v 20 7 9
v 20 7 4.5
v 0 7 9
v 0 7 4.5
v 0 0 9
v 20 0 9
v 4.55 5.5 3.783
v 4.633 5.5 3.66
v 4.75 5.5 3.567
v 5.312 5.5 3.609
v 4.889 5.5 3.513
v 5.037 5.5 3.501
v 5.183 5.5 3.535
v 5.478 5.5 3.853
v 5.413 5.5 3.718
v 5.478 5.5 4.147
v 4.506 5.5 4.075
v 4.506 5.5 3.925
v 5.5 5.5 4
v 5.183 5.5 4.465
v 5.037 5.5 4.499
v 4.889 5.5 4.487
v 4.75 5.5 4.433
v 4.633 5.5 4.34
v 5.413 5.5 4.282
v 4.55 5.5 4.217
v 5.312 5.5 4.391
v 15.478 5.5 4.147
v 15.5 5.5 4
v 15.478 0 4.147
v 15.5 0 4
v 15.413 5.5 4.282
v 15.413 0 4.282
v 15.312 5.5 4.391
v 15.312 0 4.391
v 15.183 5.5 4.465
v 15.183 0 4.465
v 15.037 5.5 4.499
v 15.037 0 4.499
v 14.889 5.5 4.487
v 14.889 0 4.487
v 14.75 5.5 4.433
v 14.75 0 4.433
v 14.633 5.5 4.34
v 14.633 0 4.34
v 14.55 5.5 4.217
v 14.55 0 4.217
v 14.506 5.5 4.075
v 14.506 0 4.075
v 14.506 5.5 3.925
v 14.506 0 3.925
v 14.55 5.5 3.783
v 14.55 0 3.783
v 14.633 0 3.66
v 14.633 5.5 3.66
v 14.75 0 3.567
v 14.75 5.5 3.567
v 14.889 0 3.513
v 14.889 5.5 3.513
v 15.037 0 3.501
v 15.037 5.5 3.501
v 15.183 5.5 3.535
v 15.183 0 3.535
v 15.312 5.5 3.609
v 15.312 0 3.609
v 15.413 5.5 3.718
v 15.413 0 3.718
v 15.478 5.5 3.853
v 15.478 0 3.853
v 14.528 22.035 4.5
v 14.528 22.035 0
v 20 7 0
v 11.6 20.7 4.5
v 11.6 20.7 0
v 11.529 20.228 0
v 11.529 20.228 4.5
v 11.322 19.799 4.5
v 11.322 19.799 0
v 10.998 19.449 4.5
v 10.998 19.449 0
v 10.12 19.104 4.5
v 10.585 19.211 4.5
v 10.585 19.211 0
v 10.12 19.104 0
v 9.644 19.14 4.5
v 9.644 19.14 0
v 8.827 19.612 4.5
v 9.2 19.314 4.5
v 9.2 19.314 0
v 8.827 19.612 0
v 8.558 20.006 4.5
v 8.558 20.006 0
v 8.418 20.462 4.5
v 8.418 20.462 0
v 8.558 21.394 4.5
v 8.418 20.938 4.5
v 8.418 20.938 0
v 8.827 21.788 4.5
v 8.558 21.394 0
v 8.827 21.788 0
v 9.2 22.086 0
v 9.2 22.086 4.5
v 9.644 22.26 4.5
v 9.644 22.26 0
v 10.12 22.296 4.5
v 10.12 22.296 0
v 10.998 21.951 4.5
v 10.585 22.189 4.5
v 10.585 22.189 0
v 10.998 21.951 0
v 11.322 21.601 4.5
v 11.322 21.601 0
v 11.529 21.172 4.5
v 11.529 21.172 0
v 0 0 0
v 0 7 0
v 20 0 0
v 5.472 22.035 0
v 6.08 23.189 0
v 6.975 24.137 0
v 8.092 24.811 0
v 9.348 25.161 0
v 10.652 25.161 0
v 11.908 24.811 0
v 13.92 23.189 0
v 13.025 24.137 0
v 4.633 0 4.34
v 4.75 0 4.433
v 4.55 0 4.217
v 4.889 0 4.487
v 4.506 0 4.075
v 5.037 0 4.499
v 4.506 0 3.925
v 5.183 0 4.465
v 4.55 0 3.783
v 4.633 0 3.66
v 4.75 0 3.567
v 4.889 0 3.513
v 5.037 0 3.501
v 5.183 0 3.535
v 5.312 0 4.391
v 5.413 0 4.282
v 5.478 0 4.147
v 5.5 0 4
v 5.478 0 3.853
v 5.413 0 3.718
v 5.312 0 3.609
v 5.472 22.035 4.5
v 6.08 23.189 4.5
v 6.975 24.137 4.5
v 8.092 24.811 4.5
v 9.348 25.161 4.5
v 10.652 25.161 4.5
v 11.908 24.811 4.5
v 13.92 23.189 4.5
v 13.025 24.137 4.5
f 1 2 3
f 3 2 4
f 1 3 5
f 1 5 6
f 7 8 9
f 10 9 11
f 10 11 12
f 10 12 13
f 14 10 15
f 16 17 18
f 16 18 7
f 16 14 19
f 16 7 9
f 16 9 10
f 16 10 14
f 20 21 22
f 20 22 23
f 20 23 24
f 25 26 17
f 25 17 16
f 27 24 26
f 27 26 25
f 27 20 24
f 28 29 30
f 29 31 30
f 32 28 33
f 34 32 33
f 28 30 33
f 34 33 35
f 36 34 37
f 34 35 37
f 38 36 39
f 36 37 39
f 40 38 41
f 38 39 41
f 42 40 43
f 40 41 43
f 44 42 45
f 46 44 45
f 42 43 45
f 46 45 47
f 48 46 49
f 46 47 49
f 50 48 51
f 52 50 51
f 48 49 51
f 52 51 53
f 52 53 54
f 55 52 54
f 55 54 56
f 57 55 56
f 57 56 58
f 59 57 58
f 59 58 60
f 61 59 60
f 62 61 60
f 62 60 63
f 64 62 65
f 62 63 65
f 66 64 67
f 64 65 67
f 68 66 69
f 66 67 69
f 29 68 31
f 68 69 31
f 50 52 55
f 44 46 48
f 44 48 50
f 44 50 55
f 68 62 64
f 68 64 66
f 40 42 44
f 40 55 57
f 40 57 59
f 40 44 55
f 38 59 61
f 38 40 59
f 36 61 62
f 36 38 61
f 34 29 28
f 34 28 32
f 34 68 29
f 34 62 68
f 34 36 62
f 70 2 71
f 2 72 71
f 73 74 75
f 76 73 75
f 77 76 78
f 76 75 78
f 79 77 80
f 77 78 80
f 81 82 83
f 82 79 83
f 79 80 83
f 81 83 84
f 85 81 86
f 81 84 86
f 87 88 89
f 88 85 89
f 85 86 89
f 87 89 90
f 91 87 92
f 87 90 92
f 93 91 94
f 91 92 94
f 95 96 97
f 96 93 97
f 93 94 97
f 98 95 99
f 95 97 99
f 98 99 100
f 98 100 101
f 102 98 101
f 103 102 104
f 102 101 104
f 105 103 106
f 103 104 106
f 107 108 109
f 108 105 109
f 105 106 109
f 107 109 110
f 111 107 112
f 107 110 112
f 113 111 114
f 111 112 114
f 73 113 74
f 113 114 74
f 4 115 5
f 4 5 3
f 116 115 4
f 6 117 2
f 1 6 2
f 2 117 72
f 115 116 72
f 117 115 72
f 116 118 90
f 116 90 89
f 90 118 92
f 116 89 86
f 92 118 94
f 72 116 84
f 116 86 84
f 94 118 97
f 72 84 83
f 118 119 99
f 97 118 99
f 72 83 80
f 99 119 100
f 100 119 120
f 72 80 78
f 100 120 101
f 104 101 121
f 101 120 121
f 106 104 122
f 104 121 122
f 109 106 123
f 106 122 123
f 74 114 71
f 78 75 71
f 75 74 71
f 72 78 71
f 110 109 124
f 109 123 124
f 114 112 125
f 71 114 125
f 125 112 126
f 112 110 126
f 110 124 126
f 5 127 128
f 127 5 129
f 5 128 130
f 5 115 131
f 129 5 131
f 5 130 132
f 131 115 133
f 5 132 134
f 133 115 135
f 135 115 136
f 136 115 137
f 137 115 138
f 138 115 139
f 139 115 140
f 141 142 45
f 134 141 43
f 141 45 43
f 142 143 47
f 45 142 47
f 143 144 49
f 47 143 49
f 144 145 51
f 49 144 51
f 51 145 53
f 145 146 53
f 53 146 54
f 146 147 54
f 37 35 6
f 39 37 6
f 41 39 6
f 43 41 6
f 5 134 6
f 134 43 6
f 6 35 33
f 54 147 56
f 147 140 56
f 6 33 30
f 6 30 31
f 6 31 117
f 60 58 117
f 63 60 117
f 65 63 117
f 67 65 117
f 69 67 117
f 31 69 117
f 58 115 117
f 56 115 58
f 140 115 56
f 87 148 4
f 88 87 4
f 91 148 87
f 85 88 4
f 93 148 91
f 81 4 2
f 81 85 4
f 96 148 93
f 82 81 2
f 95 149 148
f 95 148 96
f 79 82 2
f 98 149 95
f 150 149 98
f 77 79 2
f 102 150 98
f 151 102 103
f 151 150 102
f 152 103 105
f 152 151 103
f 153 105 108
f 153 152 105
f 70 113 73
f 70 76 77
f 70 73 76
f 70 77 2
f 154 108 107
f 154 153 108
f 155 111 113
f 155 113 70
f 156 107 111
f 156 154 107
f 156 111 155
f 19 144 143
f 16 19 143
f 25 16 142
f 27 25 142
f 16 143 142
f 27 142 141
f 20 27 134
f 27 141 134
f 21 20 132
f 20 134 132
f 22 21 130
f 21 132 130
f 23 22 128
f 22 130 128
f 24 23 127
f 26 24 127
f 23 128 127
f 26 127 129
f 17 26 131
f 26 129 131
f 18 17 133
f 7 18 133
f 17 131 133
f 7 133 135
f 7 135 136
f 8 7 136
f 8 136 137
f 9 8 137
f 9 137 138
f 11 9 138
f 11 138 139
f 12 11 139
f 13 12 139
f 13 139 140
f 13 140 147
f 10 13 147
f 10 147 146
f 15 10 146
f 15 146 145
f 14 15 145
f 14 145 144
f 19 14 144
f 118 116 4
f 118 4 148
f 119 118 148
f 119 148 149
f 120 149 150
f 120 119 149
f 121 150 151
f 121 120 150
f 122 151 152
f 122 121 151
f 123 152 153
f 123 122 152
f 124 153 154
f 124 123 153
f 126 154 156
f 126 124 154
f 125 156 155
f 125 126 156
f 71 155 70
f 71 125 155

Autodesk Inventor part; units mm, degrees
ref_plane "YZ Plane" through (0, 0, 0) normal (1, 0, 0) x (0, 1, 0)
ref_plane "XZ Plane" through (0, 0, 0) normal (0, 1, 0) x (-1, 0, 0)
ref_plane "XY Plane" through (0, 0, 0) normal (0, 0, 1) x (1, 0, 0)
sketch "Sketch1" plane through (0, 0, 0) normal (0, 0, 1) x (1, 0, 0)
  circle A0 centre (10, 20.7) radius 1.6
  line L0 (0, 0) -> (20.0001, 0)
  line L1 (0, 0) -> (0, 7)
  line L2 (20.0001, 0) -> (20.0001, 6.9998)
  line L3 (0, 7) -> (5.4723, 22.0351)
  line L4 (0, 7) -> (16, 7) construction
  line L5 (20.0001, 6.9998) -> (14.5277, 22.0349)
  line L6 (20.0001, 6.9998) -> (36.0001, 6.9998) construction
  arc A1 (14.5277, 22.0349) -> (5.4723, 22.0351) centre (10, 20.3869) ccw
  dimension "d17" = 7
  dimension "d18" = 6.9998
  dimension "d19" = 20.7
  dimension "d23" = 90
  dimension "d24" = 90
  dimension "d25" = 10
  dimension "d26" = 16
  dimension "d27" = 70
  dimension "d28" = 16
  dimension "d29" = 110
  dimension "d30" = 10
sketch "Sketch3" plane through (0, 0, 0) normal (0, 0, 1) x (1, 0, 0)
  point P0 (0, 0)
extrude "Extrusion1" add sketch "Sketch1" along normal blind 4.5
sketch "Sketch4" plane through (0, 0, 4.5) normal (0, 0, 1) x (1, 0, 0)
  line L0 (0, 7) -> (0, 0) projected
  line L1 (20.0001, 0) -> (20.0001, 6.9998) projected
  line L2 (0, 0) -> (20.0001, 0)
  line L3 (20.0001, 0) -> (20.0001, 6.9998)
  line L4 (3.884, 22.9404) -> (-0.0481, 7.0119) projected
  line L5 (20.0001, 6.9998) -> (0, 6.9998)
  line L6 (0, 7) -> (0, 0)
extrude "Extrusion2" add sketch "Sketch4" along normal blind 4.5
sketch "Sketch5" plane through (0, 0, 0) normal (0, -1, 0) x (1, 0, 0)
  circle A0 centre (5, 4) radius 0.5
  circle A1 centre (15, 4) radius 0.5
  line L0 (0, 0) -> (20.0001, 0) projected
  line L1 (0, 9) -> (20.0001, 9) projected
  dimension "d13" = 1
  dimension "d14" = 1
  dimension "d33" = 5
  dimension "d34" = 5
extrude "Extrusion3" cut sketch "Sketch5" against normal blind 5.5
properties part number "upper_deck_shaft_mount_for_AD"
